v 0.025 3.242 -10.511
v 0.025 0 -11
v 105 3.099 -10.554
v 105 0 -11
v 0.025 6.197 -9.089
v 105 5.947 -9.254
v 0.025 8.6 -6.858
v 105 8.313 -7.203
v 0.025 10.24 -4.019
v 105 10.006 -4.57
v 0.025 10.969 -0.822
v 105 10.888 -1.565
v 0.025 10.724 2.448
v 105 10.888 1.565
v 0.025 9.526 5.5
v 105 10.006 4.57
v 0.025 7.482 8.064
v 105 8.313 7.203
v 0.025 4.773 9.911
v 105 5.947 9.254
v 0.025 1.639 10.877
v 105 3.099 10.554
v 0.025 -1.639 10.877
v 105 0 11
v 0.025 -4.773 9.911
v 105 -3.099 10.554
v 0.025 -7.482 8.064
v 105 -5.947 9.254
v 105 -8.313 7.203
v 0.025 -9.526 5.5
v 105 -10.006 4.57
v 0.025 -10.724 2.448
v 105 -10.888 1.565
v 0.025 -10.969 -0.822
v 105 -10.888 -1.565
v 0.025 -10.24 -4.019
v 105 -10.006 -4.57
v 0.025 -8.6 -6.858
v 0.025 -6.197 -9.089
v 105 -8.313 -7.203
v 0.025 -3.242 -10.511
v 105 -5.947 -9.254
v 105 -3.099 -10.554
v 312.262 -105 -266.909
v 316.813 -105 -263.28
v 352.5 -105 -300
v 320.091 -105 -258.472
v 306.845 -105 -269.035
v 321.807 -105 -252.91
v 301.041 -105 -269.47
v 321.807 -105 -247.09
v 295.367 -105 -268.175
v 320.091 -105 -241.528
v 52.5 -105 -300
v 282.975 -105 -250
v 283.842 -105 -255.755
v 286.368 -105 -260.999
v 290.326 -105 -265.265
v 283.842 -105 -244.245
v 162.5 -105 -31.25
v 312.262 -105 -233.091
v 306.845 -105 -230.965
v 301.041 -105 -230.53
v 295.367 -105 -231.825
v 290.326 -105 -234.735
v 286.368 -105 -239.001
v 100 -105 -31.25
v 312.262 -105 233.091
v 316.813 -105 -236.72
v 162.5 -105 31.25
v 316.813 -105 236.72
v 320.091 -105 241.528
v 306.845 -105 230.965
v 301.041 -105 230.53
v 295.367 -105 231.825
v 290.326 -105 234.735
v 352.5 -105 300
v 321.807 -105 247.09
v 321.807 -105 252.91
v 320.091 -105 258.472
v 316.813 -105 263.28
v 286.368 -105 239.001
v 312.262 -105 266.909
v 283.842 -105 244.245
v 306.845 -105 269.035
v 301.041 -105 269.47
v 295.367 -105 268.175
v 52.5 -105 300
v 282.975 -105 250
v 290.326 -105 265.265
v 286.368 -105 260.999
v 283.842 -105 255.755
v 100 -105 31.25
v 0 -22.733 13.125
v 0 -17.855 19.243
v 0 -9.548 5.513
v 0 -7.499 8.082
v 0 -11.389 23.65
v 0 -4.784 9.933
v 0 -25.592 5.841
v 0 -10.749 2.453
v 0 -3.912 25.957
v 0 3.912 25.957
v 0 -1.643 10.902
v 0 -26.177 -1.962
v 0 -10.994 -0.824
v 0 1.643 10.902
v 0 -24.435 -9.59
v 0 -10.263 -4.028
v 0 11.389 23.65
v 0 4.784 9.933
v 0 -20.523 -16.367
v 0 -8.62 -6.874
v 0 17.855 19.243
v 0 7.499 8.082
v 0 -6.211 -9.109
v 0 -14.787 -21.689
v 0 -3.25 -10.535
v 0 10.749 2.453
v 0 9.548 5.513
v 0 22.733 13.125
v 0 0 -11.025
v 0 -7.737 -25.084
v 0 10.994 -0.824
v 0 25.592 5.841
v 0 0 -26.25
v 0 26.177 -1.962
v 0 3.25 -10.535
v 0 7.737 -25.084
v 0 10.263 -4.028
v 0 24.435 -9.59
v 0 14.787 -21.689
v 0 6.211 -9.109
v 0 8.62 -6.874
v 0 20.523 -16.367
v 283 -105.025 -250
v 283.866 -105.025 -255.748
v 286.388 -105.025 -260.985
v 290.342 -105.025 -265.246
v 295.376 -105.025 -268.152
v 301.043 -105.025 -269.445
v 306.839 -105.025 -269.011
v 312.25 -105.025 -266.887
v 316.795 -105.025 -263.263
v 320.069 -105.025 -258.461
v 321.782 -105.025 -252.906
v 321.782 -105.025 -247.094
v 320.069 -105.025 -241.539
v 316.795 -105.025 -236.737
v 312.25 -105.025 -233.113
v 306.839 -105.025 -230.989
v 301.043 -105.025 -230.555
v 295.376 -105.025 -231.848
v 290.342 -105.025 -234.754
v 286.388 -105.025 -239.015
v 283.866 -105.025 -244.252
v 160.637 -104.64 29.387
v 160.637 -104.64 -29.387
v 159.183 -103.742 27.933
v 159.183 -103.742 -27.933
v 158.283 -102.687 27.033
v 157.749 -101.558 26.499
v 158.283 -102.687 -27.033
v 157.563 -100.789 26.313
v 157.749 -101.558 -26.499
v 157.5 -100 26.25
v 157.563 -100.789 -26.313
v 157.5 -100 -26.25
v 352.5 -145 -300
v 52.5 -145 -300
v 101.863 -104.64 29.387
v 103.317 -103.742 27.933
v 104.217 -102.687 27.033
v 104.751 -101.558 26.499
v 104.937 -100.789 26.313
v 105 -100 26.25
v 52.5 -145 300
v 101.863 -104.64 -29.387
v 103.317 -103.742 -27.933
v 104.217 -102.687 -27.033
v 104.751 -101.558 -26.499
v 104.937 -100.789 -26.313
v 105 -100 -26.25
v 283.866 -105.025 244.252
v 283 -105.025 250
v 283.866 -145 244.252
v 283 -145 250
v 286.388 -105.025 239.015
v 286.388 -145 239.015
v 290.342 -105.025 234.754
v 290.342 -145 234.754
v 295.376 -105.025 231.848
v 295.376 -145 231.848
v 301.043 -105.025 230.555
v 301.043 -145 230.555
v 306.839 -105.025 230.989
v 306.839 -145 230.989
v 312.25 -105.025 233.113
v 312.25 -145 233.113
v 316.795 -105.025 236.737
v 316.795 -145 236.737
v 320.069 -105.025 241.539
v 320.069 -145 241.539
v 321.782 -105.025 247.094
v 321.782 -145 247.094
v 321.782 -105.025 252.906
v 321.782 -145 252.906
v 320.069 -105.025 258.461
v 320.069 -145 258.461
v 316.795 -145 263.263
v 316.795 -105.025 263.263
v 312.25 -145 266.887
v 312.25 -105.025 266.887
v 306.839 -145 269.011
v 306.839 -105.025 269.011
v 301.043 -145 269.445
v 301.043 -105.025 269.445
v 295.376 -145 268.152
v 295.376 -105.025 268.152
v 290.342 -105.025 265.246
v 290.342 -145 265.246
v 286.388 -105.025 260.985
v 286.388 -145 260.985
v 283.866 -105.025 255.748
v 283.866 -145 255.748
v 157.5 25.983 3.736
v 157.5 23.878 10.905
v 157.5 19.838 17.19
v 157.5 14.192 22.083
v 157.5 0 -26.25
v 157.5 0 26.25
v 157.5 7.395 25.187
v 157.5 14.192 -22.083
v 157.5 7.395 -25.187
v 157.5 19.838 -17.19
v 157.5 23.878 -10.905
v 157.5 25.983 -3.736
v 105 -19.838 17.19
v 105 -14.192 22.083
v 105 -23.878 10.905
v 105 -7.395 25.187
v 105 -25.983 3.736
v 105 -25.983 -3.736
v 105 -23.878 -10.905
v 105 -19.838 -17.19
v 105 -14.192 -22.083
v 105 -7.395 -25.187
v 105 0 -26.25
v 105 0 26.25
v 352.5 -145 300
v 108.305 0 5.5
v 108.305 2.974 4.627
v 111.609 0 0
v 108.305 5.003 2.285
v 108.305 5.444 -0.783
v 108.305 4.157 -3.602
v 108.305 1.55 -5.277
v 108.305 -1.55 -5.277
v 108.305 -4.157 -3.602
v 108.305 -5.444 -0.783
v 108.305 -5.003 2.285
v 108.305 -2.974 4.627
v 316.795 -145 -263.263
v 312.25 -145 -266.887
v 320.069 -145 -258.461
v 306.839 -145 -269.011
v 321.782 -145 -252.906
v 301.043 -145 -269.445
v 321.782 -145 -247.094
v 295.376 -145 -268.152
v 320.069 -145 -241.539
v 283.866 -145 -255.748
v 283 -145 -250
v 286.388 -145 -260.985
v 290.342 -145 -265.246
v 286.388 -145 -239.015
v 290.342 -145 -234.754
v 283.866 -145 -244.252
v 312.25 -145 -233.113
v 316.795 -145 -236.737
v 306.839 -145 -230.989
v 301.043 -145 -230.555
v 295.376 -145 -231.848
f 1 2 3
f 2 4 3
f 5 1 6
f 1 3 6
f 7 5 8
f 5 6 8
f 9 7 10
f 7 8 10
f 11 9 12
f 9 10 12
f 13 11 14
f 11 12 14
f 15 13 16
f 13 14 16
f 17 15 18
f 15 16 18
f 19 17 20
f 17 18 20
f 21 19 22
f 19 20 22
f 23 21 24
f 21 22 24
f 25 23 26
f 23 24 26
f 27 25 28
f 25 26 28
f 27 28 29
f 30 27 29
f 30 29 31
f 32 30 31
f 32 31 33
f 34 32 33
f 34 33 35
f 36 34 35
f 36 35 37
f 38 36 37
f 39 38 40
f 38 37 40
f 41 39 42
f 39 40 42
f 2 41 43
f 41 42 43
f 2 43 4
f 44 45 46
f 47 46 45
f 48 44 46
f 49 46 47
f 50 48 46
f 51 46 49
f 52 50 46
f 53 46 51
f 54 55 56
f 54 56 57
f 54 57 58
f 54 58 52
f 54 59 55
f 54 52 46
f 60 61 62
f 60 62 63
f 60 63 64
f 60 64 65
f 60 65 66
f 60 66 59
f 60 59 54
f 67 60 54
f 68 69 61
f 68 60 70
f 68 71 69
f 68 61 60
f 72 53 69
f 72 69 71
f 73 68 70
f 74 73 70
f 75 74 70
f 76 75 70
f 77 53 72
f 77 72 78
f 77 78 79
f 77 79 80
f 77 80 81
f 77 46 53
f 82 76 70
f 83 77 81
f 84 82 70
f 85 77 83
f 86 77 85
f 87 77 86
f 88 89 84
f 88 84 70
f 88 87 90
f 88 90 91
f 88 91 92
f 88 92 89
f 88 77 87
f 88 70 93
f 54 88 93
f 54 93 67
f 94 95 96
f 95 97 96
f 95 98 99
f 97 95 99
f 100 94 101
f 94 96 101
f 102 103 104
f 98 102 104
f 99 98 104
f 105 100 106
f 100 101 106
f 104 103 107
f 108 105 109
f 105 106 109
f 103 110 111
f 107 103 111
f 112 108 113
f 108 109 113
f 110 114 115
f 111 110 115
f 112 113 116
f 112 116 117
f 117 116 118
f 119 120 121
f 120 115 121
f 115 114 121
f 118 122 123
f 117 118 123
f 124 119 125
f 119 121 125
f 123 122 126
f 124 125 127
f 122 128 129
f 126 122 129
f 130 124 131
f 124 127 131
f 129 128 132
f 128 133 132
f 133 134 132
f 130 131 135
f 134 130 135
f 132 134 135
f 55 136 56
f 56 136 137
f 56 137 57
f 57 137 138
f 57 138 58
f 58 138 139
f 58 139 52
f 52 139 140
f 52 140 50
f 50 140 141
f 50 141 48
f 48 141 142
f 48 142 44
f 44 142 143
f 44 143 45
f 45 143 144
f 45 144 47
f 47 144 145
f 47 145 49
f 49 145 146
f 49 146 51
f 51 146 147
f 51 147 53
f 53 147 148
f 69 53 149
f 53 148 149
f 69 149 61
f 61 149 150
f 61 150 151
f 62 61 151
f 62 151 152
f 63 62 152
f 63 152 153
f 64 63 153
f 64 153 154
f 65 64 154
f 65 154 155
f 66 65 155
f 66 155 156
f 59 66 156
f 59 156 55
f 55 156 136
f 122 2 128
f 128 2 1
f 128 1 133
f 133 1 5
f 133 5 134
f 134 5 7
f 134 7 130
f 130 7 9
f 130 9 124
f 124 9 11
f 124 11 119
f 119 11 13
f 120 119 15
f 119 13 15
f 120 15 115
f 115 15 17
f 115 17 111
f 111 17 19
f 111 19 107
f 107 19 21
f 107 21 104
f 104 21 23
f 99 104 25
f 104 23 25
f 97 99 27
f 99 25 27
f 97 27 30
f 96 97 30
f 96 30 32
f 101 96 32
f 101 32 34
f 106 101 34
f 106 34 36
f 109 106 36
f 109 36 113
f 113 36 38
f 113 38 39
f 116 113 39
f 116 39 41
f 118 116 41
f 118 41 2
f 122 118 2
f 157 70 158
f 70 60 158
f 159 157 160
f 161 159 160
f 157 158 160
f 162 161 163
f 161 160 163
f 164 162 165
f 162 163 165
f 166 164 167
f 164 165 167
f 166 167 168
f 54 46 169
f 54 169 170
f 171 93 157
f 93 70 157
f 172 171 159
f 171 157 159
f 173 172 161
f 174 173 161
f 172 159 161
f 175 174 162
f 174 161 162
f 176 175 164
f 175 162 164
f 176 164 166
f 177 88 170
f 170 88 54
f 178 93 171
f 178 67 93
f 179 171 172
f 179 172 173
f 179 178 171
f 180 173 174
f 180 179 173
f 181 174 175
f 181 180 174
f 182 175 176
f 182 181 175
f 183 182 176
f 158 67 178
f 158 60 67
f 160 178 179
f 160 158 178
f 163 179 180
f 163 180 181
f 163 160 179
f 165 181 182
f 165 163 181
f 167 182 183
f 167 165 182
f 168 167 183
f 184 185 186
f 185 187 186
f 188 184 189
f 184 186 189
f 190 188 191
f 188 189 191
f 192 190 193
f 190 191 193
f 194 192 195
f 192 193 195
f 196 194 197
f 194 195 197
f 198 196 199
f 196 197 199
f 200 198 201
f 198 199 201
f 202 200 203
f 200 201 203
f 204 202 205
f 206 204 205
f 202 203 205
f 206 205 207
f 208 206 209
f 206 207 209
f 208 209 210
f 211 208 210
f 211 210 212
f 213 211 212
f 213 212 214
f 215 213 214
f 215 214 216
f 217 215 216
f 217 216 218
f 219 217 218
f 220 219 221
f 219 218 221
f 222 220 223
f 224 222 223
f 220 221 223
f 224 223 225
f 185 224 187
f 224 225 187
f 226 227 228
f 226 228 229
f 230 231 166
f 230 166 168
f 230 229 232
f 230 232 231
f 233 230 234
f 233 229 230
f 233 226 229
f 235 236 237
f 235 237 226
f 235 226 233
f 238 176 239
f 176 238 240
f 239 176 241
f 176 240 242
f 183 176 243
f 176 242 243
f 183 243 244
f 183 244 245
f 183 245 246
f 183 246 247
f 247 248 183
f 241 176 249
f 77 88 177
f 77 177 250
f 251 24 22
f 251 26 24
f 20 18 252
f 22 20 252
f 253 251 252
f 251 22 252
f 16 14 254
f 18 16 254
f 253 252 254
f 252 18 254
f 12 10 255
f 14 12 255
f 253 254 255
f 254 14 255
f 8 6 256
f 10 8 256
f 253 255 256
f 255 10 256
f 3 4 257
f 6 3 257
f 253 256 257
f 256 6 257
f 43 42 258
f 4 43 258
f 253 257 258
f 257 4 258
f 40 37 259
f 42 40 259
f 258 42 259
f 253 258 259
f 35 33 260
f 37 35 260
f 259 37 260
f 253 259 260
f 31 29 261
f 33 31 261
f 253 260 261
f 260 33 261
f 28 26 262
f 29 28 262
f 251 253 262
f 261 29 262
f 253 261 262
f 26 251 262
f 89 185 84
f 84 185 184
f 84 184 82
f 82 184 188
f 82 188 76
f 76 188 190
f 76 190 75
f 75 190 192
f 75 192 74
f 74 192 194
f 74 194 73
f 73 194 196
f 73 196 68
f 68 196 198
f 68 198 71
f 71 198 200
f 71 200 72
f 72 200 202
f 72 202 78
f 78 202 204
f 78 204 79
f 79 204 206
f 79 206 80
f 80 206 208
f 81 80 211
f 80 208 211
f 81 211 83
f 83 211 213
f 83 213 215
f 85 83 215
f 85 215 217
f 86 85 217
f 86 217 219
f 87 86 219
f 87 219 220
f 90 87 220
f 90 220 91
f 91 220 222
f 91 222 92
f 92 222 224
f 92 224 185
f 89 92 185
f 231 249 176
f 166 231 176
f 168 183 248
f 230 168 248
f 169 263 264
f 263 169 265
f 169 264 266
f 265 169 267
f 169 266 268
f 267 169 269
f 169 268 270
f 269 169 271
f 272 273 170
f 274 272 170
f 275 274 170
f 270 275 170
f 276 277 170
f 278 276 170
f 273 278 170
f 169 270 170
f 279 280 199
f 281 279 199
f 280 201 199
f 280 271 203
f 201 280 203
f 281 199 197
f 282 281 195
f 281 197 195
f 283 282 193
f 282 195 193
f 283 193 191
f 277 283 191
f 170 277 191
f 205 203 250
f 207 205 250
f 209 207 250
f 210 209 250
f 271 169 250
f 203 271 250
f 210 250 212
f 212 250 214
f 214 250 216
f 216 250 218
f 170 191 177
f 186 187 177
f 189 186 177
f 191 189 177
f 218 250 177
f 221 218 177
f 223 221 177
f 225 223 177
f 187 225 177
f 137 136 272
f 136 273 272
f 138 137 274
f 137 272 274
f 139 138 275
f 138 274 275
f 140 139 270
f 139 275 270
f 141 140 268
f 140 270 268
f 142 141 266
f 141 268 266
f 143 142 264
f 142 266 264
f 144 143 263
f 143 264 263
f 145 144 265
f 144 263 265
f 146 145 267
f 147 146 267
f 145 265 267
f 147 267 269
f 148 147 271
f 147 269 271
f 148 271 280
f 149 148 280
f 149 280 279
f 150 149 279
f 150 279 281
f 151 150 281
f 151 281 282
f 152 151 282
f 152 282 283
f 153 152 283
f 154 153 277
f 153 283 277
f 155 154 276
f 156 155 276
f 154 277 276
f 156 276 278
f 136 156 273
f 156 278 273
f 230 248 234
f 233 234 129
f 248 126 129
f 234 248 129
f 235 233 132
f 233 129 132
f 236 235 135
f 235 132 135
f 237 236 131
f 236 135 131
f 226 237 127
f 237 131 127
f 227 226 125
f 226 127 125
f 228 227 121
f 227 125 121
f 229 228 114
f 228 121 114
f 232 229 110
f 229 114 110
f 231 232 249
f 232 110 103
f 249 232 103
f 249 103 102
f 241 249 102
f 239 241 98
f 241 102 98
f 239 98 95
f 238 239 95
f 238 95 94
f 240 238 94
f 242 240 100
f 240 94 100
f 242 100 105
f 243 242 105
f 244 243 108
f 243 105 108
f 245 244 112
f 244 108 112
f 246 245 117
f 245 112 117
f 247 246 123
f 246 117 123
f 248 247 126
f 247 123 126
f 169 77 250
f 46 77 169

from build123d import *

# Parameters (mm, degrees)
SKETCH1_R                              = 26.25
BOSS_EXTRUDE1_DEPTH                    = 105
BOSS_EXTRUDE2_DEPTH                    = 52.5
TAP_DRILL_FOR_M24X2_0_TAP1_D           = 22
TAP_DRILL_FOR_M24X2_0_TAP1_DEPTH       = 105
TAP_DRILL_FOR_M24X2_0_TAP1_CSINK_D     = 22.05
TAP_DRILL_FOR_M24X2_0_TAP1_CSINK_ANGLE = 90
TAP_DRILL_FOR_M24X2_0_TAP1_TIP         = 6.609466809
BOSS_EXTRUDE3_DEPTH                    = 40
FILLET1_R                              = 5
TAP_DRILL_FOR_M42X3_0_TAP1_D           = 39
TAP_DRILL_FOR_M42X3_0_TAP1_CSINK_D     = 39.05
TAP_DRILL_FOR_M42X3_0_TAP1_CSINK_ANGLE = 90


with BuildPart() as part:
    # Sketch1 → Boss-Extrude1 (new body)
    with BuildSketch(Plane(origin=(0, 0, 0), x_dir=(0, 0, -1), z_dir=(1, 0, 0))):
        Circle(SKETCH1_R)
    extrude(amount=BOSS_EXTRUDE1_DEPTH)

    # Sketch2 → Boss-Extrude2 (add)
    with BuildSketch(Plane(origin=(105, 0, 0), x_dir=(0, 0, -1), z_dir=(1, 0, 0))):
        with BuildLine():
            Line((-26.25, 0), (-26.25, -105))
            Line((-26.25, -105), (26.25, -105))
            Line((26.25, -105), (26.25, 0))
            ThreePointArc((26.25, 0), (0, 26.25), (-26.25, 0))
        make_face()
    extrude(amount=BOSS_EXTRUDE2_DEPTH)

    # Tap Drill for M24x2.0 Tap1
    with Locations(Plane.ZY):
        with Locations((0, 0)):
            CounterSinkHole(TAP_DRILL_FOR_M24X2_0_TAP1_D / 2, TAP_DRILL_FOR_M24X2_0_TAP1_CSINK_D / 2, depth=TAP_DRILL_FOR_M24X2_0_TAP1_DEPTH, counter_sink_angle=TAP_DRILL_FOR_M24X2_0_TAP1_CSINK_ANGLE)
            with Locations((0, 0, -(TAP_DRILL_FOR_M24X2_0_TAP1_DEPTH + TAP_DRILL_FOR_M24X2_0_TAP1_TIP / 2))):  # 118° drill point
                Cone(0, TAP_DRILL_FOR_M24X2_0_TAP1_D / 2, TAP_DRILL_FOR_M24X2_0_TAP1_TIP, mode=Mode.SUBTRACT)

    # Sketch7 → Boss-Extrude3 (add)
    with BuildSketch(Plane.XZ.offset(105)):
        Polygon((52.5, 300), (352.5, 300), (352.5, -300), (52.5, -300), (52.5, 0), align=None)
    extrude(amount=BOSS_EXTRUDE3_DEPTH)

    # Fillet1
    fillet1_edges = [part.edges().sort_by_distance(p)[0] for p in [
        (105, -105, 0),
        (131.25, -105, 26.25),
        (131.25, -105, -26.25),
        (157.5, -105, 0),
    ]]
    fillet(fillet1_edges, radius=FILLET1_R)

    # Tap Drill for M42x3.0 Tap1 (through all)
    with Locations(Plane(origin=(0, -105, 0), x_dir=(1, 0, 0), z_dir=(0, 1, 0))):
        with Locations((302.5, -250), (302.5, 250)):
            CounterSinkHole(TAP_DRILL_FOR_M42X3_0_TAP1_D / 2, TAP_DRILL_FOR_M42X3_0_TAP1_CSINK_D / 2, counter_sink_angle=TAP_DRILL_FOR_M42X3_0_TAP1_CSINK_ANGLE)


solid = part.part
